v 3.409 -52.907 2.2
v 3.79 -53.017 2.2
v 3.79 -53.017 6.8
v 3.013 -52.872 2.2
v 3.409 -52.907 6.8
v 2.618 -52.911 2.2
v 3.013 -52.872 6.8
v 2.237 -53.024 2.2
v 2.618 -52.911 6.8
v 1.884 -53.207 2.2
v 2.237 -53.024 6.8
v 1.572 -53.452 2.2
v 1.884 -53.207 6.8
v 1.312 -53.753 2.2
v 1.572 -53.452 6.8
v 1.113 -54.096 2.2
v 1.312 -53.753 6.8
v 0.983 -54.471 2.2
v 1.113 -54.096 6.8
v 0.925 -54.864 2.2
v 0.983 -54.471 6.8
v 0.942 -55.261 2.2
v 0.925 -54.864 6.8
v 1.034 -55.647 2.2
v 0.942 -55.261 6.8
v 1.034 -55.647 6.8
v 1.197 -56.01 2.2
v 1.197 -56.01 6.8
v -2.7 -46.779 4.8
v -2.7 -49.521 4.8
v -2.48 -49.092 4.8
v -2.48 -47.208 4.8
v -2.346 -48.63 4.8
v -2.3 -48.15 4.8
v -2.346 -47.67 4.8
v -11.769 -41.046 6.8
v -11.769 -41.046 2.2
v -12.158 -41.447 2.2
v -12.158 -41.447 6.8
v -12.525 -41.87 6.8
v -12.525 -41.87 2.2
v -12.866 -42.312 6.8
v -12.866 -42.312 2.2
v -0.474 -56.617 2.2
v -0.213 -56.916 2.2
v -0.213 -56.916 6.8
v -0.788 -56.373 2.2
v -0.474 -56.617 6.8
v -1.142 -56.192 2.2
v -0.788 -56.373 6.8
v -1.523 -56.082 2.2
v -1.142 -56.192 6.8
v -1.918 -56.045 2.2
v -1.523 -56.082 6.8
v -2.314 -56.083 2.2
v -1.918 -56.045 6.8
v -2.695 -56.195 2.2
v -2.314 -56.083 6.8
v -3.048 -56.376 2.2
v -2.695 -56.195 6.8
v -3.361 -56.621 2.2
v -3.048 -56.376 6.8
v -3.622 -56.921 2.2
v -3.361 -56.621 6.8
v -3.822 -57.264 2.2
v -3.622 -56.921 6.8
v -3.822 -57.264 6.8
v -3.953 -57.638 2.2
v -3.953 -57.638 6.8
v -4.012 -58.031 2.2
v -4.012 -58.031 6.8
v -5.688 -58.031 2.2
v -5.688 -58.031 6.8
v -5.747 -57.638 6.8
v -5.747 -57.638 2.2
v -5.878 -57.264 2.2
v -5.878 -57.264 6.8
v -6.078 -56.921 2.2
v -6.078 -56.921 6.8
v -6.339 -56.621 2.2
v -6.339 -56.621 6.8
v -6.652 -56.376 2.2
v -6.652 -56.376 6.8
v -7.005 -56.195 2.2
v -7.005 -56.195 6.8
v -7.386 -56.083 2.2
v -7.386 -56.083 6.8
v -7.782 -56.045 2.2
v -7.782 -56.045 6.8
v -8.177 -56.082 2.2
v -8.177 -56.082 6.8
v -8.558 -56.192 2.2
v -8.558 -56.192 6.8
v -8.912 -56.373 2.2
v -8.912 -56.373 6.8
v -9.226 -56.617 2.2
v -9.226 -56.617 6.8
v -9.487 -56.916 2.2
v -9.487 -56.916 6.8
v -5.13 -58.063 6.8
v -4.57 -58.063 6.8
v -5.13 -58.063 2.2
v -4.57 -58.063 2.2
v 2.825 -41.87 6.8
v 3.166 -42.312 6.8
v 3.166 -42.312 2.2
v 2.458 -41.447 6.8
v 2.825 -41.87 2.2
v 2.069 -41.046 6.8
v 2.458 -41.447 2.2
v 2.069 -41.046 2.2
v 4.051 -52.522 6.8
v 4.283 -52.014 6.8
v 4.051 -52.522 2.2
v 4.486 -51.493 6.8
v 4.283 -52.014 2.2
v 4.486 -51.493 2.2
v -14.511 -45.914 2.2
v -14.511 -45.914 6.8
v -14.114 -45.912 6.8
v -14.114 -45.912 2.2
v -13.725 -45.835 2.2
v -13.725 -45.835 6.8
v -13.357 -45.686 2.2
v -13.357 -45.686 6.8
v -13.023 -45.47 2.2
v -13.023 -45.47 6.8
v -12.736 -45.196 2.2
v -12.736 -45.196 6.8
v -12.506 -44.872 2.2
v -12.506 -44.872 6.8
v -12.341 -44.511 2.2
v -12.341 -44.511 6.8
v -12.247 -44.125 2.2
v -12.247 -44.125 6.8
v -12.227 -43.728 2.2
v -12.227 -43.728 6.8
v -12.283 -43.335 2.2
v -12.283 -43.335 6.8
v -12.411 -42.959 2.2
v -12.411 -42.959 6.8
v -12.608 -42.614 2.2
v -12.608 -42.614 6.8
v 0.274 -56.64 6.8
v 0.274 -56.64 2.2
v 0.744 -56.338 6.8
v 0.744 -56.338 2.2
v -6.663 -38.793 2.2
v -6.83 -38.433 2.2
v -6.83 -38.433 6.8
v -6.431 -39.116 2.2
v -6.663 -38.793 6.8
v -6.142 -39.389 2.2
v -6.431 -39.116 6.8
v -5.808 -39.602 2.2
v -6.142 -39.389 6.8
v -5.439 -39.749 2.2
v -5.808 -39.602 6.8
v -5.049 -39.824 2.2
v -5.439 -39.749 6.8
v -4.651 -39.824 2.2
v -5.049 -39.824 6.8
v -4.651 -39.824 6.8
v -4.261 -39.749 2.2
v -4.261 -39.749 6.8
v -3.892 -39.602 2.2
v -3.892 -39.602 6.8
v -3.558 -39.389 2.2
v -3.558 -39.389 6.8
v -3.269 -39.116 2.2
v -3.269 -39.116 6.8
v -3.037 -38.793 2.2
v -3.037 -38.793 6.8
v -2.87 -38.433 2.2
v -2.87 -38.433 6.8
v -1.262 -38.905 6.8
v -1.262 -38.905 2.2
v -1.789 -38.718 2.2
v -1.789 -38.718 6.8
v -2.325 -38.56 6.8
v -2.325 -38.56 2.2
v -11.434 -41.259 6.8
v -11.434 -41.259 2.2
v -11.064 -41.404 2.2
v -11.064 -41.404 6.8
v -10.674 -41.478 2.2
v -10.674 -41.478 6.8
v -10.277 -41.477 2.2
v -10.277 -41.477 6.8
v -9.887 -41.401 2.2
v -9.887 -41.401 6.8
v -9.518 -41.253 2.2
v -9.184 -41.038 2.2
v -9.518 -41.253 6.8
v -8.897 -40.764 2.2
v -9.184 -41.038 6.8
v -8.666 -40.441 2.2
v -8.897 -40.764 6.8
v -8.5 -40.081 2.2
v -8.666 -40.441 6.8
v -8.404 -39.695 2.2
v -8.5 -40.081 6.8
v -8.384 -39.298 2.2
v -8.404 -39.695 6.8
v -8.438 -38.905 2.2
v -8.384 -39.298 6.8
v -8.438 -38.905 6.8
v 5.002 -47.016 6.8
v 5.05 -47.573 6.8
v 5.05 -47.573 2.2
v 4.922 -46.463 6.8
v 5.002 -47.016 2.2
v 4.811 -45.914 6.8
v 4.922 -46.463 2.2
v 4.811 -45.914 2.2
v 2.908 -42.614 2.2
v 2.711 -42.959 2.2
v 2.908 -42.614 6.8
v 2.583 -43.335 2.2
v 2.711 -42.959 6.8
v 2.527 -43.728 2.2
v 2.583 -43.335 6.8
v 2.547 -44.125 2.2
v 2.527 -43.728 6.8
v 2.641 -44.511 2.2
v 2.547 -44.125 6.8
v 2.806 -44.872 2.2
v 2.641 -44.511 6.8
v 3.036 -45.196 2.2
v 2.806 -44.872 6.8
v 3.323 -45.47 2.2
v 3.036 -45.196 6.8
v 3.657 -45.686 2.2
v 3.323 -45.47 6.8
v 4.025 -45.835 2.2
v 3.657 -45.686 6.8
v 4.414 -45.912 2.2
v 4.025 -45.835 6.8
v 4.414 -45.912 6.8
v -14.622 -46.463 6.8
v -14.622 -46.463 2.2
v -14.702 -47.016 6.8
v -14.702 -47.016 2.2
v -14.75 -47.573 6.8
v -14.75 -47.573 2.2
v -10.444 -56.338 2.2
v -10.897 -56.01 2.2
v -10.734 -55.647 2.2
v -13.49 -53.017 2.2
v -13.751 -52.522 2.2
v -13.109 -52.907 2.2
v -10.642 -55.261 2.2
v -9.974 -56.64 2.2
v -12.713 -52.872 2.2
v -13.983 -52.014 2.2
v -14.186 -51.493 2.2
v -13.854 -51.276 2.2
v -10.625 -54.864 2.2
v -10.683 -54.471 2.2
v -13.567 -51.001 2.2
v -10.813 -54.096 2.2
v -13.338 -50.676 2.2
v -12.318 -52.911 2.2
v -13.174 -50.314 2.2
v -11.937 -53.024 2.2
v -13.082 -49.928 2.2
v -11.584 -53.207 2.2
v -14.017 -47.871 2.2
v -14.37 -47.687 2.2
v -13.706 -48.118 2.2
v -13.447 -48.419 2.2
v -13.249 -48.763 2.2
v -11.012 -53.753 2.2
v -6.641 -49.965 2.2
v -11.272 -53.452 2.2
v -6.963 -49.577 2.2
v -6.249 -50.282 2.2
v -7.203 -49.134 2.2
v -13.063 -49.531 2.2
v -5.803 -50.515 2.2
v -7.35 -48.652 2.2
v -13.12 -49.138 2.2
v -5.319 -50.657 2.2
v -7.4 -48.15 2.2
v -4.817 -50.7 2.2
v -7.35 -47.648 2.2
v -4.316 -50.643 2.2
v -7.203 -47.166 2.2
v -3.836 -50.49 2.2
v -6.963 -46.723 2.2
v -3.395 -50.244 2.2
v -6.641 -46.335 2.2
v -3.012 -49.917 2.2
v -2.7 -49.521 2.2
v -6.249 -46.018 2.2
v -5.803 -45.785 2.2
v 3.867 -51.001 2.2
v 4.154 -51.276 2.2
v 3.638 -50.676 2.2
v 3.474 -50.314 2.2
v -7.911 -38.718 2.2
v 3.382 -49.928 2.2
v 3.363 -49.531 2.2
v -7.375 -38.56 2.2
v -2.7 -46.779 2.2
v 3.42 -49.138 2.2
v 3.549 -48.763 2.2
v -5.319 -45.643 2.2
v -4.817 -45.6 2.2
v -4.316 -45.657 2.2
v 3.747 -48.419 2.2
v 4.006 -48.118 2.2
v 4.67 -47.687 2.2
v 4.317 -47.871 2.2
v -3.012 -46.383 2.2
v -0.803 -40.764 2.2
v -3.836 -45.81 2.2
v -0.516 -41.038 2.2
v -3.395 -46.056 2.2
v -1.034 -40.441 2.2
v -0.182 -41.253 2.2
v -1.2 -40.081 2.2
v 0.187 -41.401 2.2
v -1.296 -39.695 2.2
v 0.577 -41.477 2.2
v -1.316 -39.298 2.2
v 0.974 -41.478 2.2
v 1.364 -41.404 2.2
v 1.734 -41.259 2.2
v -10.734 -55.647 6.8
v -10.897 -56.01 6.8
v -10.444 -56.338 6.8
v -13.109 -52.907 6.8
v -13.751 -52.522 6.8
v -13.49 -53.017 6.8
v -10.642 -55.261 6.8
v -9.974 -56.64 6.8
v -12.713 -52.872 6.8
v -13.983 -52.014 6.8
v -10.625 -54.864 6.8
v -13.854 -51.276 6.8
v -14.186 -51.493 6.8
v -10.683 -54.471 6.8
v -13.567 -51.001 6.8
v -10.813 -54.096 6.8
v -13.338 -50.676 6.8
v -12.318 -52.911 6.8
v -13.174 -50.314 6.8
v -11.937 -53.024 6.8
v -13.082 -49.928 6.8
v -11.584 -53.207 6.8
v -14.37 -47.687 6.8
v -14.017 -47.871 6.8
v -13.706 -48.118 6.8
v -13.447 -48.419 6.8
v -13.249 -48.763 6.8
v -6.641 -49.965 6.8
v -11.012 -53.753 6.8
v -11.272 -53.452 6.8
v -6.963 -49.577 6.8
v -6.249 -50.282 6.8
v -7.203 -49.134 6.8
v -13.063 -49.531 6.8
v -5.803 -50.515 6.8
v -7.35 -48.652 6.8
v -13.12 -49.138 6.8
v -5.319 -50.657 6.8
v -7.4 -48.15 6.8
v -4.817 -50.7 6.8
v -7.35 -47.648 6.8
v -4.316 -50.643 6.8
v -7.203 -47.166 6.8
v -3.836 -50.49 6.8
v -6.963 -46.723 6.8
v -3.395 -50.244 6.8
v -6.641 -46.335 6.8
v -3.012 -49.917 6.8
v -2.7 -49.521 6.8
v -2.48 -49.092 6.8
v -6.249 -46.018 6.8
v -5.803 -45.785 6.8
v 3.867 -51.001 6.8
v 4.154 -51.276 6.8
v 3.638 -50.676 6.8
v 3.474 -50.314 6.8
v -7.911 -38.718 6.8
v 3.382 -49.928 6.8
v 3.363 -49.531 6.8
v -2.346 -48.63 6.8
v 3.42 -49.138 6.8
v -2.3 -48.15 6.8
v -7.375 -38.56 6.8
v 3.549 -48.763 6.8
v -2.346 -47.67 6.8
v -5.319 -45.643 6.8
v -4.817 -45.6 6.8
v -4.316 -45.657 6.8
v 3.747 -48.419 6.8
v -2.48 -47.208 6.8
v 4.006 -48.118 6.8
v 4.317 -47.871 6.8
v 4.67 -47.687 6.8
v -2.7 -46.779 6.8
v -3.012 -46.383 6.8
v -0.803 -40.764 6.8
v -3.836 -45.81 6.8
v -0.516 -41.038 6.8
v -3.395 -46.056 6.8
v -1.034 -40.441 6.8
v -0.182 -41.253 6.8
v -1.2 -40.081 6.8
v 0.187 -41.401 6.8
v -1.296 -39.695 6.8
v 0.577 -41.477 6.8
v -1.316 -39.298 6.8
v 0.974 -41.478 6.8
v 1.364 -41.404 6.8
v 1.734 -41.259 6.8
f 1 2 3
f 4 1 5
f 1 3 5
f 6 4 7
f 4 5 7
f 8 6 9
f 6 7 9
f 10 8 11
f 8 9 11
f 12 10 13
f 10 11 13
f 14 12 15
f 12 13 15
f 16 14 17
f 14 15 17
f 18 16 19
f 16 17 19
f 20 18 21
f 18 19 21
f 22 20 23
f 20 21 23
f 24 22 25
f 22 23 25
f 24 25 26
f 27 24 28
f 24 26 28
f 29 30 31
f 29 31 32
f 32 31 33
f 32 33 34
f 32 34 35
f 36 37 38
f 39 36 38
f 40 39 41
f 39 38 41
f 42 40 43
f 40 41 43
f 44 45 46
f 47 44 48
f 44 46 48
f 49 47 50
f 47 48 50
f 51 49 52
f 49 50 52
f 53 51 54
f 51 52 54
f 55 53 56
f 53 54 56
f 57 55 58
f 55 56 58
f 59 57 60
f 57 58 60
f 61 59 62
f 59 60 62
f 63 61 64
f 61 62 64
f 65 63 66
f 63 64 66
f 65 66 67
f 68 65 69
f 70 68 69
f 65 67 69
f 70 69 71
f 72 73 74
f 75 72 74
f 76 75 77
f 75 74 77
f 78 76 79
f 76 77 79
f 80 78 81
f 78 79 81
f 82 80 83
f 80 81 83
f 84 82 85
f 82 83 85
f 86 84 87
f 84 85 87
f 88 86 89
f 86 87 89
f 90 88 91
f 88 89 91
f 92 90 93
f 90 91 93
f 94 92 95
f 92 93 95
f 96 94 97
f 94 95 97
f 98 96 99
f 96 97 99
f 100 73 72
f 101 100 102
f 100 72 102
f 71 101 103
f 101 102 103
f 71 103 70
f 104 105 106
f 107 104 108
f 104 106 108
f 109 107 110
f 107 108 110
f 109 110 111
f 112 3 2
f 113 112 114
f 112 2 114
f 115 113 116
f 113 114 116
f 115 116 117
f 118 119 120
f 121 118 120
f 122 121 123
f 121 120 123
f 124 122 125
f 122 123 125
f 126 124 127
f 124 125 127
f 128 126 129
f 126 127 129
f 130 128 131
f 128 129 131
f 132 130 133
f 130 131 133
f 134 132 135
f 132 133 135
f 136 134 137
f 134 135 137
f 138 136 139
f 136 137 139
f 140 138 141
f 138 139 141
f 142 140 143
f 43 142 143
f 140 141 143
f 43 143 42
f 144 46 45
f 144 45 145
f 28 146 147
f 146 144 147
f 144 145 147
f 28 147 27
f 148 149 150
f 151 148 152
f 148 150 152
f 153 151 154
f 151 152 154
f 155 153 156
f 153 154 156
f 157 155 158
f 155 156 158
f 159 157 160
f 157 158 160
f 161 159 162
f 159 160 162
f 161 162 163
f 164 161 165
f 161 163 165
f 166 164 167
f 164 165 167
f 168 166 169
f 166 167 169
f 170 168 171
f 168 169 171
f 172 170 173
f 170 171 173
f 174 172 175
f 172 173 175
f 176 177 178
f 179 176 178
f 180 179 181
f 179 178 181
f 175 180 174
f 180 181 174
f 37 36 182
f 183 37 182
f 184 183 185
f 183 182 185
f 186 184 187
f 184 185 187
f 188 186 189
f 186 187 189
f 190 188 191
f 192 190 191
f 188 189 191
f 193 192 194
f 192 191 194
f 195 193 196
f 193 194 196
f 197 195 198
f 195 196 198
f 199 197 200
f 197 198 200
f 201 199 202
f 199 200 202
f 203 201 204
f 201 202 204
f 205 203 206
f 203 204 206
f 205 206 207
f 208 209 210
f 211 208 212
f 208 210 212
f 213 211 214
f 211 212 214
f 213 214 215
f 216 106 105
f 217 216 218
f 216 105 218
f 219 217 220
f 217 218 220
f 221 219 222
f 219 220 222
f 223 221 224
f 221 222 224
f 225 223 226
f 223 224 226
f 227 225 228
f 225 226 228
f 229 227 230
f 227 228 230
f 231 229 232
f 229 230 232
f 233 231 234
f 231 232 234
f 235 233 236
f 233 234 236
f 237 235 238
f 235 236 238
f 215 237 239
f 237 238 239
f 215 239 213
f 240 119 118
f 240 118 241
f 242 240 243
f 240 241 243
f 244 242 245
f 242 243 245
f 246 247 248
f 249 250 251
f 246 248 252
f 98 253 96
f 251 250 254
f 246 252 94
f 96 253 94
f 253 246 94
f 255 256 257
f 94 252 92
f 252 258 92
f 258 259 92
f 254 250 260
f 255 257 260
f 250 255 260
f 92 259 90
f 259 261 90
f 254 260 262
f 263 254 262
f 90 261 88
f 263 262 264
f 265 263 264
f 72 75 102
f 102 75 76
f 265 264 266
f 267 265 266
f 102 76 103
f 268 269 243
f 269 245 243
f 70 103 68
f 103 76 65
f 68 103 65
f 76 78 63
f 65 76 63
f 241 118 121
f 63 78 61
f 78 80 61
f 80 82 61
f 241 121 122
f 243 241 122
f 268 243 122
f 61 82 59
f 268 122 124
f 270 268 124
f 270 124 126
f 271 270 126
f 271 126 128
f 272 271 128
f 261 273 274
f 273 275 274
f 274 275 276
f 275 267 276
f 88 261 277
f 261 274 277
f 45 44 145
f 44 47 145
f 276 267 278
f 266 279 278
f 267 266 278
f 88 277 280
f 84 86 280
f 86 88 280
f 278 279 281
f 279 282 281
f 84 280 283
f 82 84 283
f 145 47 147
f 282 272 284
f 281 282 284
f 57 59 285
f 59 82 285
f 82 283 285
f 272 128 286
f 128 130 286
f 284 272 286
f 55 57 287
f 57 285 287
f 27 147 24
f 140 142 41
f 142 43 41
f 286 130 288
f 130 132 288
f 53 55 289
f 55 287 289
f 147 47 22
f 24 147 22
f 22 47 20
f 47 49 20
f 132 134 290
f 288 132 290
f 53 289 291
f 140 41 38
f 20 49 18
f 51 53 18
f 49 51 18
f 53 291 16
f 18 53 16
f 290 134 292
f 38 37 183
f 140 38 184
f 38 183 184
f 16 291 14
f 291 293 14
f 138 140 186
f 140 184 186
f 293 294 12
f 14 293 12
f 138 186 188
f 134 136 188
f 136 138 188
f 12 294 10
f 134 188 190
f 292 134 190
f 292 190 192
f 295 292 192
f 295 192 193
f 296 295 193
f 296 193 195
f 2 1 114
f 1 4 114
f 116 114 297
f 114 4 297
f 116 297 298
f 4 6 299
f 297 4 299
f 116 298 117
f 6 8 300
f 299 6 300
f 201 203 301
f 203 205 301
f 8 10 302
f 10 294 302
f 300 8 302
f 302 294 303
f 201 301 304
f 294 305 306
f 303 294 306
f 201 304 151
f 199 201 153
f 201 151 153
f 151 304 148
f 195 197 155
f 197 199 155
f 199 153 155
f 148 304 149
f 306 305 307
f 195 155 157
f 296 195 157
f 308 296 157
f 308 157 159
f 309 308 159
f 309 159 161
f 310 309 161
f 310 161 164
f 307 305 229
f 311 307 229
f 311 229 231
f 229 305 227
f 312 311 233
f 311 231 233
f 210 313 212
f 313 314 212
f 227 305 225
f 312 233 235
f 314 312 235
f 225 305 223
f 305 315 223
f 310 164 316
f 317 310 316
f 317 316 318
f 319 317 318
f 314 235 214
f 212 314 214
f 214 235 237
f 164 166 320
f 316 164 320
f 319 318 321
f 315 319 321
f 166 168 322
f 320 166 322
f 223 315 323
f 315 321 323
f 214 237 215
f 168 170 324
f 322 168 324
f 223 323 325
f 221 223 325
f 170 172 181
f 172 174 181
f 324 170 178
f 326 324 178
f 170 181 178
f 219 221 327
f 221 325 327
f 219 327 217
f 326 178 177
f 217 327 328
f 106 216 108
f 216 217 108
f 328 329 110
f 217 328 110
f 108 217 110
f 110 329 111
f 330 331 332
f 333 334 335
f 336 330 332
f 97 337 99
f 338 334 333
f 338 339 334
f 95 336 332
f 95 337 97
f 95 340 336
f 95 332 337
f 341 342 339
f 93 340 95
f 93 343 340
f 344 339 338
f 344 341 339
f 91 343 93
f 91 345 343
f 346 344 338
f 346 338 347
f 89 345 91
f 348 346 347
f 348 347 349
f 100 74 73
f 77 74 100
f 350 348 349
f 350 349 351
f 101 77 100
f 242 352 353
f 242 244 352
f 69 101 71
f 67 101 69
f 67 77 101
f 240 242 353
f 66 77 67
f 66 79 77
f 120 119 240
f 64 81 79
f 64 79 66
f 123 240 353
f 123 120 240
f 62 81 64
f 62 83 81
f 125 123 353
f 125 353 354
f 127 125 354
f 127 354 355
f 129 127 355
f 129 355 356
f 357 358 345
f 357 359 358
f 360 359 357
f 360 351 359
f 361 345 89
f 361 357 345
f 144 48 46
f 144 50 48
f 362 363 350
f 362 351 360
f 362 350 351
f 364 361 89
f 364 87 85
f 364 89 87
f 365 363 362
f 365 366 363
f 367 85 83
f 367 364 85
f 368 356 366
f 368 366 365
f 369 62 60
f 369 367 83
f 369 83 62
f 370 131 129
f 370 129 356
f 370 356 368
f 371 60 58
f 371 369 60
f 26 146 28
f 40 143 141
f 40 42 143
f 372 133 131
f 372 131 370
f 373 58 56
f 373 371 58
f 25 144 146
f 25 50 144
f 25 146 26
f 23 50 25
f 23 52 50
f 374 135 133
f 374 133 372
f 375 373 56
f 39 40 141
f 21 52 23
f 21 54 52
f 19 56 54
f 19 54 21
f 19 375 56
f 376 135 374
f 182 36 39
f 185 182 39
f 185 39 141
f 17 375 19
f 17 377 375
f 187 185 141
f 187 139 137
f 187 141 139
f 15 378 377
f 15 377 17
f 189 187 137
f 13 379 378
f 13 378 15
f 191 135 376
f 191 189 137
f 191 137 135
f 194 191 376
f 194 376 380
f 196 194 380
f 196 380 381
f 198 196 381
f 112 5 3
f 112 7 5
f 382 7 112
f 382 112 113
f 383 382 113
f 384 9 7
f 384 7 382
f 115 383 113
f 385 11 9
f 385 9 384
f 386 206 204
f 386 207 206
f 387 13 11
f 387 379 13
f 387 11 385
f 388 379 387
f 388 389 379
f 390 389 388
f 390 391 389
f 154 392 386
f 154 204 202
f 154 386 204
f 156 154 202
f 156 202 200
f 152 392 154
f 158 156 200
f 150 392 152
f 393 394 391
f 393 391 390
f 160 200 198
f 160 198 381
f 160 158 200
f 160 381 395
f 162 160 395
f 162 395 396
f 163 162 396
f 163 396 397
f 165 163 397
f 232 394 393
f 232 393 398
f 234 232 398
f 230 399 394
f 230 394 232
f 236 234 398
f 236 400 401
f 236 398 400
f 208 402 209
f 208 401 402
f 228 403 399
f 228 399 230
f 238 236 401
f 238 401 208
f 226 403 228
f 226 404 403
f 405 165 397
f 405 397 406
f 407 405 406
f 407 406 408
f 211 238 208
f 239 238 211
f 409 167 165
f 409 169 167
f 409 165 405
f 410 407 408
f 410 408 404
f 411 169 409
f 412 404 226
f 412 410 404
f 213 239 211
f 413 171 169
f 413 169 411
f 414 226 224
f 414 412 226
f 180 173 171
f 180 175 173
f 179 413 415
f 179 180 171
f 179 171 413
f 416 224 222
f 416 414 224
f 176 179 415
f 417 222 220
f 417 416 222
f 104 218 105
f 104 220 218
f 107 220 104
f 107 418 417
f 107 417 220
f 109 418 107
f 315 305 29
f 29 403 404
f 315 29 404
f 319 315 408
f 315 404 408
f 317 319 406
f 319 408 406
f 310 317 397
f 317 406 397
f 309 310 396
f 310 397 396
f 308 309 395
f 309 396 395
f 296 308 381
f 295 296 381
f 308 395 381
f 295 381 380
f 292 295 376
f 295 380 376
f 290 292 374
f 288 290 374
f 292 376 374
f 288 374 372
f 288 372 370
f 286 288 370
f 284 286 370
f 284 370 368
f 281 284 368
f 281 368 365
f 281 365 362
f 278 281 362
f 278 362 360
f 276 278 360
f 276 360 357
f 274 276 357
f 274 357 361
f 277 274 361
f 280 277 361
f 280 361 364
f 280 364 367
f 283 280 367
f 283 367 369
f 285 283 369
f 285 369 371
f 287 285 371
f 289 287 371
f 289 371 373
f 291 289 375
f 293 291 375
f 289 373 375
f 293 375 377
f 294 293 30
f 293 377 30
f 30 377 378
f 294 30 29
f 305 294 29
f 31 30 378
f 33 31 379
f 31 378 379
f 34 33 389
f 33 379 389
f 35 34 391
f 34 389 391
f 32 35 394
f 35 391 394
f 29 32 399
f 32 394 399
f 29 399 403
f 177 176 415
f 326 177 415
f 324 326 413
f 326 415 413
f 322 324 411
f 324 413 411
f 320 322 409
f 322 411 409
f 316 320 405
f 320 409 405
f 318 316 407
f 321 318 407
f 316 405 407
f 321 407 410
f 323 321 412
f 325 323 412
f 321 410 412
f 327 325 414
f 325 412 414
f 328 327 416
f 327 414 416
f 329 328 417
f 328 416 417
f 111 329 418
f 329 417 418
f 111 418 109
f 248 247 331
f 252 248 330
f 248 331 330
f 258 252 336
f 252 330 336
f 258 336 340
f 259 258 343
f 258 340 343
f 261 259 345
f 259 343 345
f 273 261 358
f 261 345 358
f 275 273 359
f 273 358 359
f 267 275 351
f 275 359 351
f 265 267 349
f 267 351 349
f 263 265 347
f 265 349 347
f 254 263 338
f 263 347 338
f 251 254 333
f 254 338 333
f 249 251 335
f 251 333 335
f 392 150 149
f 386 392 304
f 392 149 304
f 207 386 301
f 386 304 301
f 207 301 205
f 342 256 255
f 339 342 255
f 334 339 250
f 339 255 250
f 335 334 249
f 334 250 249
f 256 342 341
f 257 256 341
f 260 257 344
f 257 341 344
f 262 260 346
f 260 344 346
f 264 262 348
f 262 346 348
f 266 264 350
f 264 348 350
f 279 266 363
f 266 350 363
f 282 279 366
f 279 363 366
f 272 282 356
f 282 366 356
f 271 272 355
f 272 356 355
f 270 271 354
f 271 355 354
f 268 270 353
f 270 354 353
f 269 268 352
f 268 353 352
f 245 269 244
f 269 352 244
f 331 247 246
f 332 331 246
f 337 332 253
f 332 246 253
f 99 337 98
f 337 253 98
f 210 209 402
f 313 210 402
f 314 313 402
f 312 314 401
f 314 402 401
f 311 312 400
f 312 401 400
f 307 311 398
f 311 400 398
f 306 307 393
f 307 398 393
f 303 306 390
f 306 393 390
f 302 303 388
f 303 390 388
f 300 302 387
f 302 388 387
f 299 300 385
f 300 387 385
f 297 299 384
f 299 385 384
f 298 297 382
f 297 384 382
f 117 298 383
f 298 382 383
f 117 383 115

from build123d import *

# Parameters (mm, degrees)
SKETCH024_R           = 9.9166910254
PAD016_DEPTH          = 4.6
SKETCH025_R           = 2.1
POCKET004_DEPTH       = 61.4476740325
POLARPATTERN001_COUNT = 11
POCKET005_DEPTH       = 4.601
SKETCH037_R           = 2.55
POCKET012_DEPTH       = 2


with BuildPart() as part:
    # Sketch024 → Pad016 (new body)
    with BuildSketch(Plane.XY):
        Circle(SKETCH024_R)
    extrude(amount=PAD016_DEPTH)

    # Sketch025 (on Face3 of Pad016) → Pocket004 (cut, through all)
    with BuildSketch(Plane.XY.offset(4.6)):
        with Locations((0, 10.4166910254)):
            Circle(SKETCH025_R)
    pocket004 = extrude(amount=-POCKET004_DEPTH, mode=Mode.SUBTRACT)

    # PolarPattern001: Pocket004 ×11 about axis
    polarpattern001_axis = Axis((0, 0, 4.6), (0, 0, 1))
    for i in range(1, POLARPATTERN001_COUNT):
        add(pocket004.rotate(polarpattern001_axis, i * 360 / POLARPATTERN001_COUNT), mode=Mode.SUBTRACT)

    # Sketch026 (on Face4 of PolarPattern001) → Pocket005 (cut, through all)
    with BuildSketch(Plane.XY.offset(4.6)):
        with BuildLine():
            ThreePointArc((2.15, 1.3711309201), (-2.55, 0), (2.15, -1.3711309201))
            Line((2.15, -1.3711309201), (2.15, 1.3711309201))
        make_face()
    extrude(amount=-POCKET005_DEPTH, mode=Mode.SUBTRACT)

    # Sketch037 (on Face4 of Pocket005) → Pocket012 (cut)
    with BuildSketch(Plane.XY.offset(4.6)):
        Circle(SKETCH037_R)
    extrude(amount=-POCKET012_DEPTH, mode=Mode.SUBTRACT)


with BuildPart() as part_1:
    # Body004 placement: moved
    add(part.part.moved(Location((-4.85, -48.15, 2.2))))


solid = part_1.part
